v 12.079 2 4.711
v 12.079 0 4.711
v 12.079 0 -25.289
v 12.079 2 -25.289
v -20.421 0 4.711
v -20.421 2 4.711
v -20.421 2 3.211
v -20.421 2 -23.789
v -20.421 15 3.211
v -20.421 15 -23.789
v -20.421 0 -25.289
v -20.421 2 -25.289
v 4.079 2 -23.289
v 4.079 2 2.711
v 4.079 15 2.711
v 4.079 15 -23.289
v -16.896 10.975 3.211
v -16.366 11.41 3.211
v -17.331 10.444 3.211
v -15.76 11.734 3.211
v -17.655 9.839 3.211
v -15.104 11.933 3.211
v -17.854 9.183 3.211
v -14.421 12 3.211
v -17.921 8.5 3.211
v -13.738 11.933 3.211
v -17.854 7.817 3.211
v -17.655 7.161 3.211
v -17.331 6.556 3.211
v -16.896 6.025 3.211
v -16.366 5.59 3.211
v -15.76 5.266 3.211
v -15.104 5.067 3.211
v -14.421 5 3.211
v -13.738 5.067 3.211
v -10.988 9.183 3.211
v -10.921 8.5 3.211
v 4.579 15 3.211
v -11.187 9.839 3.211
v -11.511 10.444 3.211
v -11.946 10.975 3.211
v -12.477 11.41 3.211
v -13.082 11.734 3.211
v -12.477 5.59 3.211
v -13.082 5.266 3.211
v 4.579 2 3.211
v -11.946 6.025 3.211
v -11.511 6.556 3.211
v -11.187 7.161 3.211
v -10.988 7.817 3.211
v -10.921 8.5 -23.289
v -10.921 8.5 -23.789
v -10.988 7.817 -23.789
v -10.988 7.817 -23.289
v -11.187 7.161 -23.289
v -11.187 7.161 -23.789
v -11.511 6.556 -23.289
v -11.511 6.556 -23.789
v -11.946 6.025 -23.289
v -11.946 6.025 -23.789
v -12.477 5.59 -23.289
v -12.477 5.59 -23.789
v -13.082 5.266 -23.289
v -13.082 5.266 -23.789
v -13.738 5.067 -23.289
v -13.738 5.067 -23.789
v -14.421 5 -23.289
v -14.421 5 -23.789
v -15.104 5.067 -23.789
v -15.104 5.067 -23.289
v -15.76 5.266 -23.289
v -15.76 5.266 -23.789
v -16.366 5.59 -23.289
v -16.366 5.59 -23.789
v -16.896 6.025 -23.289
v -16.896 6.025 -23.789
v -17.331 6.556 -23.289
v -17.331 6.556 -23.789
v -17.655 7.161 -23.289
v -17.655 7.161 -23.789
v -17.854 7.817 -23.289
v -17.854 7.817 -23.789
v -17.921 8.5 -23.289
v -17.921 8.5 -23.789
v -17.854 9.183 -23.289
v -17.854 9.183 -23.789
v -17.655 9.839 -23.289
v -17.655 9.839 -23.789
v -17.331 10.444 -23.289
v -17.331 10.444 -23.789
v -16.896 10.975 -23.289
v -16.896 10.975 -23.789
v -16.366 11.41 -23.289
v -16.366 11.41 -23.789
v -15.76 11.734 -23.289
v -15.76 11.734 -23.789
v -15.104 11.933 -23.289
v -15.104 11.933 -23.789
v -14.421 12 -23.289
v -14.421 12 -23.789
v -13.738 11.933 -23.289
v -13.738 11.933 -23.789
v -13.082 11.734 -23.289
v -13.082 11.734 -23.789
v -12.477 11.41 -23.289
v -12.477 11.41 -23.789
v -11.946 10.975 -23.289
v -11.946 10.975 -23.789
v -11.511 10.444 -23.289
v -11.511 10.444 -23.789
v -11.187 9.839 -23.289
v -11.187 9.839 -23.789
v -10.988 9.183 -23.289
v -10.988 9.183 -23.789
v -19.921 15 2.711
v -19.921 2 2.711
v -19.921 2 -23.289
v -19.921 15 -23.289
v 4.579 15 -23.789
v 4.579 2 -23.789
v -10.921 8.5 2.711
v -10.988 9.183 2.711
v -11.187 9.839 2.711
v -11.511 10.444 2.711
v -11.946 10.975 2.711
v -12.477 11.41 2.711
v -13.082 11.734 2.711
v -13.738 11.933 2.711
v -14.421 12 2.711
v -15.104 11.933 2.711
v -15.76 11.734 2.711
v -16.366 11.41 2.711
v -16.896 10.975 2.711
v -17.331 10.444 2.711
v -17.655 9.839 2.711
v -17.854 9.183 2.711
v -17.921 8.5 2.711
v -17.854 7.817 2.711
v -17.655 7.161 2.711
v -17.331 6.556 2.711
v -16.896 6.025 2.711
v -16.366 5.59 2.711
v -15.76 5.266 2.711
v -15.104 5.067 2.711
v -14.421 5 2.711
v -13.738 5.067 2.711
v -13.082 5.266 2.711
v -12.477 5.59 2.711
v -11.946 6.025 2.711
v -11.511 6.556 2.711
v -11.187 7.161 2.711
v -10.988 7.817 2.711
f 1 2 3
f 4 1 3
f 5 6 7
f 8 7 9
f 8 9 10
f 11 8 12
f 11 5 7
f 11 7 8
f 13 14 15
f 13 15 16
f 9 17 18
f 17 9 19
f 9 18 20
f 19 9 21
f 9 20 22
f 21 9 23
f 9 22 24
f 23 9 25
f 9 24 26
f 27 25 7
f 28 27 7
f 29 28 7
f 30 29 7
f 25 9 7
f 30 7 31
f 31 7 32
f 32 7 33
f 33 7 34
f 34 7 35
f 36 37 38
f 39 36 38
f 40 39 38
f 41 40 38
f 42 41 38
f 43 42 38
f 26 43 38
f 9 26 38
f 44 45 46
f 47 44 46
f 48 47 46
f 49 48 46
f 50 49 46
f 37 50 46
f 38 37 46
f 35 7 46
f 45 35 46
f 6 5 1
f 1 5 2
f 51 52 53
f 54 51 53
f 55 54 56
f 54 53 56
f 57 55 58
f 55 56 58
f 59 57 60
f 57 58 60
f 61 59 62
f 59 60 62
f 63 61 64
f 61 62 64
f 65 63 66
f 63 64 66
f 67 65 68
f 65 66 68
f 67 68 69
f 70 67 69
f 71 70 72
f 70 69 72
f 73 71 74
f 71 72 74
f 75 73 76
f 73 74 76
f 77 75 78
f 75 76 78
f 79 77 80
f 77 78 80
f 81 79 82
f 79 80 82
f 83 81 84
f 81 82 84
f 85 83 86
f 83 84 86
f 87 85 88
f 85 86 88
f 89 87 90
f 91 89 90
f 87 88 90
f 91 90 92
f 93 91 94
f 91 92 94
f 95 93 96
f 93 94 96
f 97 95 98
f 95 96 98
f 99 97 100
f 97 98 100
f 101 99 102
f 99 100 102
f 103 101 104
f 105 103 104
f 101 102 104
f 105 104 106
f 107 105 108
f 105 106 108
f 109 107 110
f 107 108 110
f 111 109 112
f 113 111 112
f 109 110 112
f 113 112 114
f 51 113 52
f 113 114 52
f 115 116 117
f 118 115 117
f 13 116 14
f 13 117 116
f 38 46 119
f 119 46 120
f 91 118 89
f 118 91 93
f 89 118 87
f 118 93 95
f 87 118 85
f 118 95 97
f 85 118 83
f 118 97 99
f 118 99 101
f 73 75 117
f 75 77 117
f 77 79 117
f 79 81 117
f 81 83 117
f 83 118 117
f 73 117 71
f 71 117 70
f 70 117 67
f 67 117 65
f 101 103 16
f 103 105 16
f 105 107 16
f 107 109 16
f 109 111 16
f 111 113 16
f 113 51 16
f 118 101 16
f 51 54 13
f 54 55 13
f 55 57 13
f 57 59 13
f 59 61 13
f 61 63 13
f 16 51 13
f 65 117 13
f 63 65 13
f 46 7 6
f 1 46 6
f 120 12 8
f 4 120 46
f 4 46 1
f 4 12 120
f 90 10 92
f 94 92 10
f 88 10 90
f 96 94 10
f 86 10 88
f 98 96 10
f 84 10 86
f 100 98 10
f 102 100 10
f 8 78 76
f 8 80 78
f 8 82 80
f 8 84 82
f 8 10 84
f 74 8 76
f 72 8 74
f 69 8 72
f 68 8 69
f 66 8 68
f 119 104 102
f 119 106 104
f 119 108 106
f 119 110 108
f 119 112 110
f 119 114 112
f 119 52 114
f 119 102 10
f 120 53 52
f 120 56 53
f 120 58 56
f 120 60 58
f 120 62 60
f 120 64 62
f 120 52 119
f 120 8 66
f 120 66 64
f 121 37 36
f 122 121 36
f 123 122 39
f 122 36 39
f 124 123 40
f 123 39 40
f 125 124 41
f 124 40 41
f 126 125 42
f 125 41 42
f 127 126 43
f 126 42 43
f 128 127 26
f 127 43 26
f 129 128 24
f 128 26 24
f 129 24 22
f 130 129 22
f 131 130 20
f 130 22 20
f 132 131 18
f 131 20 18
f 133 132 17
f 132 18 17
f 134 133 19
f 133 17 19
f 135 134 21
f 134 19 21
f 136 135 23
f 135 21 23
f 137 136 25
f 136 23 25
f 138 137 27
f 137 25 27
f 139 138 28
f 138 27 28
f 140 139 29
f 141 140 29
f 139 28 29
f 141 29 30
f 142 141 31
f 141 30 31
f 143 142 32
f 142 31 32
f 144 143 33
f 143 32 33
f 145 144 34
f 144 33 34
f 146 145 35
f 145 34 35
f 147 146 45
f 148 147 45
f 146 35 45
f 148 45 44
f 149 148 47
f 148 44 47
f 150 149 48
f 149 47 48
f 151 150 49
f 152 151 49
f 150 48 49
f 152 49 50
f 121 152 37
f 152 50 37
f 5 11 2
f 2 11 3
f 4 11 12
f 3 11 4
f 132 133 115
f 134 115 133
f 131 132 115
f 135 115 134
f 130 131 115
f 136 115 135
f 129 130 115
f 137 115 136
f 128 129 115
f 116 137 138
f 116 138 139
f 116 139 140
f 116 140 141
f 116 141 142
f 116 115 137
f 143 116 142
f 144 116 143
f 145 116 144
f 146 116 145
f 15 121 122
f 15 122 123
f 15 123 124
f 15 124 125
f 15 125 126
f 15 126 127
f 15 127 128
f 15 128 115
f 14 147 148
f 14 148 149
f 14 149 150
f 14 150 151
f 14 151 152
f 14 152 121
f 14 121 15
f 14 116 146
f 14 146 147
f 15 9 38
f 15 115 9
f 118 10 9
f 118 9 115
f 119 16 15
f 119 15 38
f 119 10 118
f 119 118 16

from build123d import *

# Parameters (mm, degrees)
ESQUISSE1_W             = 32.5
ESQUISSE1_H             = 30
BOSS_EXTRU_1_DEPTH      = 2
ESQUISSE1_4_W           = 25
ESQUISSE1_4_H           = 27
ESQUISSE1_4_W_2         = 24
ESQUISSE1_4_H_2         = 26
BOSS_EXTRU_2_DEPTH      = 15
ESQUISSE6_R             = 3.5
ENL_V_MAT_EXTRU_2_DEPTH = 0.5
ENL_V_START             = -0.5
ESQUISSE5_R             = 3.5
ENL_V_MAT_EXTRU_3_DEPTH = 0.5


with BuildPart() as part:
    # Esquisse1 → Boss.-Extru.1 (new body)
    with BuildSketch(Plane(origin=(0, 0, 0), x_dir=(1, 0, 0), z_dir=(0, 1, 0))):
        with Locations((-4.171052632, 10.289473684)):
            Rectangle(ESQUISSE1_W, ESQUISSE1_H)
    extrude(amount=BOSS_EXTRU_1_DEPTH)

    # Esquisse1<4> → Boss.-Extru.2 (add)
    with BuildSketch(Plane(origin=(0, 0, 0), x_dir=(1, 0, 0), z_dir=(0, 1, 0))):
        with Locations((-7.921052632, 10.289473684)):
            Rectangle(ESQUISSE1_4_W, ESQUISSE1_4_H)
        with Locations((-7.921052632, 10.289473684)):
            Rectangle(ESQUISSE1_4_W_2, ESQUISSE1_4_H_2, mode=Mode.SUBTRACT)
    extrude(amount=BOSS_EXTRU_2_DEPTH)

    # Esquisse6 → Enlèv. mat.-Extru.2 (cut)
    with BuildSketch(Plane.XY.offset(3.210526316)):
        with Locations((-14.421052632, 8.5)):
            Circle(ESQUISSE6_R)
    extrude(amount=-ENL_V_MAT_EXTRU_2_DEPTH, mode=Mode.SUBTRACT)

    # Esquisse5 → Enlèv. mat.-Extru.3 (cut)
    with BuildSketch(Plane(origin=(0, 0, -23.789473684), x_dir=(-1, 0, 0), z_dir=(0, 0, -1)).offset(ENL_V_START)):
        with Locations((14.421052632, 8.5)):
            Circle(ESQUISSE5_R)
    extrude(amount=ENL_V_MAT_EXTRU_3_DEPTH, mode=Mode.SUBTRACT)


solid = part.part
